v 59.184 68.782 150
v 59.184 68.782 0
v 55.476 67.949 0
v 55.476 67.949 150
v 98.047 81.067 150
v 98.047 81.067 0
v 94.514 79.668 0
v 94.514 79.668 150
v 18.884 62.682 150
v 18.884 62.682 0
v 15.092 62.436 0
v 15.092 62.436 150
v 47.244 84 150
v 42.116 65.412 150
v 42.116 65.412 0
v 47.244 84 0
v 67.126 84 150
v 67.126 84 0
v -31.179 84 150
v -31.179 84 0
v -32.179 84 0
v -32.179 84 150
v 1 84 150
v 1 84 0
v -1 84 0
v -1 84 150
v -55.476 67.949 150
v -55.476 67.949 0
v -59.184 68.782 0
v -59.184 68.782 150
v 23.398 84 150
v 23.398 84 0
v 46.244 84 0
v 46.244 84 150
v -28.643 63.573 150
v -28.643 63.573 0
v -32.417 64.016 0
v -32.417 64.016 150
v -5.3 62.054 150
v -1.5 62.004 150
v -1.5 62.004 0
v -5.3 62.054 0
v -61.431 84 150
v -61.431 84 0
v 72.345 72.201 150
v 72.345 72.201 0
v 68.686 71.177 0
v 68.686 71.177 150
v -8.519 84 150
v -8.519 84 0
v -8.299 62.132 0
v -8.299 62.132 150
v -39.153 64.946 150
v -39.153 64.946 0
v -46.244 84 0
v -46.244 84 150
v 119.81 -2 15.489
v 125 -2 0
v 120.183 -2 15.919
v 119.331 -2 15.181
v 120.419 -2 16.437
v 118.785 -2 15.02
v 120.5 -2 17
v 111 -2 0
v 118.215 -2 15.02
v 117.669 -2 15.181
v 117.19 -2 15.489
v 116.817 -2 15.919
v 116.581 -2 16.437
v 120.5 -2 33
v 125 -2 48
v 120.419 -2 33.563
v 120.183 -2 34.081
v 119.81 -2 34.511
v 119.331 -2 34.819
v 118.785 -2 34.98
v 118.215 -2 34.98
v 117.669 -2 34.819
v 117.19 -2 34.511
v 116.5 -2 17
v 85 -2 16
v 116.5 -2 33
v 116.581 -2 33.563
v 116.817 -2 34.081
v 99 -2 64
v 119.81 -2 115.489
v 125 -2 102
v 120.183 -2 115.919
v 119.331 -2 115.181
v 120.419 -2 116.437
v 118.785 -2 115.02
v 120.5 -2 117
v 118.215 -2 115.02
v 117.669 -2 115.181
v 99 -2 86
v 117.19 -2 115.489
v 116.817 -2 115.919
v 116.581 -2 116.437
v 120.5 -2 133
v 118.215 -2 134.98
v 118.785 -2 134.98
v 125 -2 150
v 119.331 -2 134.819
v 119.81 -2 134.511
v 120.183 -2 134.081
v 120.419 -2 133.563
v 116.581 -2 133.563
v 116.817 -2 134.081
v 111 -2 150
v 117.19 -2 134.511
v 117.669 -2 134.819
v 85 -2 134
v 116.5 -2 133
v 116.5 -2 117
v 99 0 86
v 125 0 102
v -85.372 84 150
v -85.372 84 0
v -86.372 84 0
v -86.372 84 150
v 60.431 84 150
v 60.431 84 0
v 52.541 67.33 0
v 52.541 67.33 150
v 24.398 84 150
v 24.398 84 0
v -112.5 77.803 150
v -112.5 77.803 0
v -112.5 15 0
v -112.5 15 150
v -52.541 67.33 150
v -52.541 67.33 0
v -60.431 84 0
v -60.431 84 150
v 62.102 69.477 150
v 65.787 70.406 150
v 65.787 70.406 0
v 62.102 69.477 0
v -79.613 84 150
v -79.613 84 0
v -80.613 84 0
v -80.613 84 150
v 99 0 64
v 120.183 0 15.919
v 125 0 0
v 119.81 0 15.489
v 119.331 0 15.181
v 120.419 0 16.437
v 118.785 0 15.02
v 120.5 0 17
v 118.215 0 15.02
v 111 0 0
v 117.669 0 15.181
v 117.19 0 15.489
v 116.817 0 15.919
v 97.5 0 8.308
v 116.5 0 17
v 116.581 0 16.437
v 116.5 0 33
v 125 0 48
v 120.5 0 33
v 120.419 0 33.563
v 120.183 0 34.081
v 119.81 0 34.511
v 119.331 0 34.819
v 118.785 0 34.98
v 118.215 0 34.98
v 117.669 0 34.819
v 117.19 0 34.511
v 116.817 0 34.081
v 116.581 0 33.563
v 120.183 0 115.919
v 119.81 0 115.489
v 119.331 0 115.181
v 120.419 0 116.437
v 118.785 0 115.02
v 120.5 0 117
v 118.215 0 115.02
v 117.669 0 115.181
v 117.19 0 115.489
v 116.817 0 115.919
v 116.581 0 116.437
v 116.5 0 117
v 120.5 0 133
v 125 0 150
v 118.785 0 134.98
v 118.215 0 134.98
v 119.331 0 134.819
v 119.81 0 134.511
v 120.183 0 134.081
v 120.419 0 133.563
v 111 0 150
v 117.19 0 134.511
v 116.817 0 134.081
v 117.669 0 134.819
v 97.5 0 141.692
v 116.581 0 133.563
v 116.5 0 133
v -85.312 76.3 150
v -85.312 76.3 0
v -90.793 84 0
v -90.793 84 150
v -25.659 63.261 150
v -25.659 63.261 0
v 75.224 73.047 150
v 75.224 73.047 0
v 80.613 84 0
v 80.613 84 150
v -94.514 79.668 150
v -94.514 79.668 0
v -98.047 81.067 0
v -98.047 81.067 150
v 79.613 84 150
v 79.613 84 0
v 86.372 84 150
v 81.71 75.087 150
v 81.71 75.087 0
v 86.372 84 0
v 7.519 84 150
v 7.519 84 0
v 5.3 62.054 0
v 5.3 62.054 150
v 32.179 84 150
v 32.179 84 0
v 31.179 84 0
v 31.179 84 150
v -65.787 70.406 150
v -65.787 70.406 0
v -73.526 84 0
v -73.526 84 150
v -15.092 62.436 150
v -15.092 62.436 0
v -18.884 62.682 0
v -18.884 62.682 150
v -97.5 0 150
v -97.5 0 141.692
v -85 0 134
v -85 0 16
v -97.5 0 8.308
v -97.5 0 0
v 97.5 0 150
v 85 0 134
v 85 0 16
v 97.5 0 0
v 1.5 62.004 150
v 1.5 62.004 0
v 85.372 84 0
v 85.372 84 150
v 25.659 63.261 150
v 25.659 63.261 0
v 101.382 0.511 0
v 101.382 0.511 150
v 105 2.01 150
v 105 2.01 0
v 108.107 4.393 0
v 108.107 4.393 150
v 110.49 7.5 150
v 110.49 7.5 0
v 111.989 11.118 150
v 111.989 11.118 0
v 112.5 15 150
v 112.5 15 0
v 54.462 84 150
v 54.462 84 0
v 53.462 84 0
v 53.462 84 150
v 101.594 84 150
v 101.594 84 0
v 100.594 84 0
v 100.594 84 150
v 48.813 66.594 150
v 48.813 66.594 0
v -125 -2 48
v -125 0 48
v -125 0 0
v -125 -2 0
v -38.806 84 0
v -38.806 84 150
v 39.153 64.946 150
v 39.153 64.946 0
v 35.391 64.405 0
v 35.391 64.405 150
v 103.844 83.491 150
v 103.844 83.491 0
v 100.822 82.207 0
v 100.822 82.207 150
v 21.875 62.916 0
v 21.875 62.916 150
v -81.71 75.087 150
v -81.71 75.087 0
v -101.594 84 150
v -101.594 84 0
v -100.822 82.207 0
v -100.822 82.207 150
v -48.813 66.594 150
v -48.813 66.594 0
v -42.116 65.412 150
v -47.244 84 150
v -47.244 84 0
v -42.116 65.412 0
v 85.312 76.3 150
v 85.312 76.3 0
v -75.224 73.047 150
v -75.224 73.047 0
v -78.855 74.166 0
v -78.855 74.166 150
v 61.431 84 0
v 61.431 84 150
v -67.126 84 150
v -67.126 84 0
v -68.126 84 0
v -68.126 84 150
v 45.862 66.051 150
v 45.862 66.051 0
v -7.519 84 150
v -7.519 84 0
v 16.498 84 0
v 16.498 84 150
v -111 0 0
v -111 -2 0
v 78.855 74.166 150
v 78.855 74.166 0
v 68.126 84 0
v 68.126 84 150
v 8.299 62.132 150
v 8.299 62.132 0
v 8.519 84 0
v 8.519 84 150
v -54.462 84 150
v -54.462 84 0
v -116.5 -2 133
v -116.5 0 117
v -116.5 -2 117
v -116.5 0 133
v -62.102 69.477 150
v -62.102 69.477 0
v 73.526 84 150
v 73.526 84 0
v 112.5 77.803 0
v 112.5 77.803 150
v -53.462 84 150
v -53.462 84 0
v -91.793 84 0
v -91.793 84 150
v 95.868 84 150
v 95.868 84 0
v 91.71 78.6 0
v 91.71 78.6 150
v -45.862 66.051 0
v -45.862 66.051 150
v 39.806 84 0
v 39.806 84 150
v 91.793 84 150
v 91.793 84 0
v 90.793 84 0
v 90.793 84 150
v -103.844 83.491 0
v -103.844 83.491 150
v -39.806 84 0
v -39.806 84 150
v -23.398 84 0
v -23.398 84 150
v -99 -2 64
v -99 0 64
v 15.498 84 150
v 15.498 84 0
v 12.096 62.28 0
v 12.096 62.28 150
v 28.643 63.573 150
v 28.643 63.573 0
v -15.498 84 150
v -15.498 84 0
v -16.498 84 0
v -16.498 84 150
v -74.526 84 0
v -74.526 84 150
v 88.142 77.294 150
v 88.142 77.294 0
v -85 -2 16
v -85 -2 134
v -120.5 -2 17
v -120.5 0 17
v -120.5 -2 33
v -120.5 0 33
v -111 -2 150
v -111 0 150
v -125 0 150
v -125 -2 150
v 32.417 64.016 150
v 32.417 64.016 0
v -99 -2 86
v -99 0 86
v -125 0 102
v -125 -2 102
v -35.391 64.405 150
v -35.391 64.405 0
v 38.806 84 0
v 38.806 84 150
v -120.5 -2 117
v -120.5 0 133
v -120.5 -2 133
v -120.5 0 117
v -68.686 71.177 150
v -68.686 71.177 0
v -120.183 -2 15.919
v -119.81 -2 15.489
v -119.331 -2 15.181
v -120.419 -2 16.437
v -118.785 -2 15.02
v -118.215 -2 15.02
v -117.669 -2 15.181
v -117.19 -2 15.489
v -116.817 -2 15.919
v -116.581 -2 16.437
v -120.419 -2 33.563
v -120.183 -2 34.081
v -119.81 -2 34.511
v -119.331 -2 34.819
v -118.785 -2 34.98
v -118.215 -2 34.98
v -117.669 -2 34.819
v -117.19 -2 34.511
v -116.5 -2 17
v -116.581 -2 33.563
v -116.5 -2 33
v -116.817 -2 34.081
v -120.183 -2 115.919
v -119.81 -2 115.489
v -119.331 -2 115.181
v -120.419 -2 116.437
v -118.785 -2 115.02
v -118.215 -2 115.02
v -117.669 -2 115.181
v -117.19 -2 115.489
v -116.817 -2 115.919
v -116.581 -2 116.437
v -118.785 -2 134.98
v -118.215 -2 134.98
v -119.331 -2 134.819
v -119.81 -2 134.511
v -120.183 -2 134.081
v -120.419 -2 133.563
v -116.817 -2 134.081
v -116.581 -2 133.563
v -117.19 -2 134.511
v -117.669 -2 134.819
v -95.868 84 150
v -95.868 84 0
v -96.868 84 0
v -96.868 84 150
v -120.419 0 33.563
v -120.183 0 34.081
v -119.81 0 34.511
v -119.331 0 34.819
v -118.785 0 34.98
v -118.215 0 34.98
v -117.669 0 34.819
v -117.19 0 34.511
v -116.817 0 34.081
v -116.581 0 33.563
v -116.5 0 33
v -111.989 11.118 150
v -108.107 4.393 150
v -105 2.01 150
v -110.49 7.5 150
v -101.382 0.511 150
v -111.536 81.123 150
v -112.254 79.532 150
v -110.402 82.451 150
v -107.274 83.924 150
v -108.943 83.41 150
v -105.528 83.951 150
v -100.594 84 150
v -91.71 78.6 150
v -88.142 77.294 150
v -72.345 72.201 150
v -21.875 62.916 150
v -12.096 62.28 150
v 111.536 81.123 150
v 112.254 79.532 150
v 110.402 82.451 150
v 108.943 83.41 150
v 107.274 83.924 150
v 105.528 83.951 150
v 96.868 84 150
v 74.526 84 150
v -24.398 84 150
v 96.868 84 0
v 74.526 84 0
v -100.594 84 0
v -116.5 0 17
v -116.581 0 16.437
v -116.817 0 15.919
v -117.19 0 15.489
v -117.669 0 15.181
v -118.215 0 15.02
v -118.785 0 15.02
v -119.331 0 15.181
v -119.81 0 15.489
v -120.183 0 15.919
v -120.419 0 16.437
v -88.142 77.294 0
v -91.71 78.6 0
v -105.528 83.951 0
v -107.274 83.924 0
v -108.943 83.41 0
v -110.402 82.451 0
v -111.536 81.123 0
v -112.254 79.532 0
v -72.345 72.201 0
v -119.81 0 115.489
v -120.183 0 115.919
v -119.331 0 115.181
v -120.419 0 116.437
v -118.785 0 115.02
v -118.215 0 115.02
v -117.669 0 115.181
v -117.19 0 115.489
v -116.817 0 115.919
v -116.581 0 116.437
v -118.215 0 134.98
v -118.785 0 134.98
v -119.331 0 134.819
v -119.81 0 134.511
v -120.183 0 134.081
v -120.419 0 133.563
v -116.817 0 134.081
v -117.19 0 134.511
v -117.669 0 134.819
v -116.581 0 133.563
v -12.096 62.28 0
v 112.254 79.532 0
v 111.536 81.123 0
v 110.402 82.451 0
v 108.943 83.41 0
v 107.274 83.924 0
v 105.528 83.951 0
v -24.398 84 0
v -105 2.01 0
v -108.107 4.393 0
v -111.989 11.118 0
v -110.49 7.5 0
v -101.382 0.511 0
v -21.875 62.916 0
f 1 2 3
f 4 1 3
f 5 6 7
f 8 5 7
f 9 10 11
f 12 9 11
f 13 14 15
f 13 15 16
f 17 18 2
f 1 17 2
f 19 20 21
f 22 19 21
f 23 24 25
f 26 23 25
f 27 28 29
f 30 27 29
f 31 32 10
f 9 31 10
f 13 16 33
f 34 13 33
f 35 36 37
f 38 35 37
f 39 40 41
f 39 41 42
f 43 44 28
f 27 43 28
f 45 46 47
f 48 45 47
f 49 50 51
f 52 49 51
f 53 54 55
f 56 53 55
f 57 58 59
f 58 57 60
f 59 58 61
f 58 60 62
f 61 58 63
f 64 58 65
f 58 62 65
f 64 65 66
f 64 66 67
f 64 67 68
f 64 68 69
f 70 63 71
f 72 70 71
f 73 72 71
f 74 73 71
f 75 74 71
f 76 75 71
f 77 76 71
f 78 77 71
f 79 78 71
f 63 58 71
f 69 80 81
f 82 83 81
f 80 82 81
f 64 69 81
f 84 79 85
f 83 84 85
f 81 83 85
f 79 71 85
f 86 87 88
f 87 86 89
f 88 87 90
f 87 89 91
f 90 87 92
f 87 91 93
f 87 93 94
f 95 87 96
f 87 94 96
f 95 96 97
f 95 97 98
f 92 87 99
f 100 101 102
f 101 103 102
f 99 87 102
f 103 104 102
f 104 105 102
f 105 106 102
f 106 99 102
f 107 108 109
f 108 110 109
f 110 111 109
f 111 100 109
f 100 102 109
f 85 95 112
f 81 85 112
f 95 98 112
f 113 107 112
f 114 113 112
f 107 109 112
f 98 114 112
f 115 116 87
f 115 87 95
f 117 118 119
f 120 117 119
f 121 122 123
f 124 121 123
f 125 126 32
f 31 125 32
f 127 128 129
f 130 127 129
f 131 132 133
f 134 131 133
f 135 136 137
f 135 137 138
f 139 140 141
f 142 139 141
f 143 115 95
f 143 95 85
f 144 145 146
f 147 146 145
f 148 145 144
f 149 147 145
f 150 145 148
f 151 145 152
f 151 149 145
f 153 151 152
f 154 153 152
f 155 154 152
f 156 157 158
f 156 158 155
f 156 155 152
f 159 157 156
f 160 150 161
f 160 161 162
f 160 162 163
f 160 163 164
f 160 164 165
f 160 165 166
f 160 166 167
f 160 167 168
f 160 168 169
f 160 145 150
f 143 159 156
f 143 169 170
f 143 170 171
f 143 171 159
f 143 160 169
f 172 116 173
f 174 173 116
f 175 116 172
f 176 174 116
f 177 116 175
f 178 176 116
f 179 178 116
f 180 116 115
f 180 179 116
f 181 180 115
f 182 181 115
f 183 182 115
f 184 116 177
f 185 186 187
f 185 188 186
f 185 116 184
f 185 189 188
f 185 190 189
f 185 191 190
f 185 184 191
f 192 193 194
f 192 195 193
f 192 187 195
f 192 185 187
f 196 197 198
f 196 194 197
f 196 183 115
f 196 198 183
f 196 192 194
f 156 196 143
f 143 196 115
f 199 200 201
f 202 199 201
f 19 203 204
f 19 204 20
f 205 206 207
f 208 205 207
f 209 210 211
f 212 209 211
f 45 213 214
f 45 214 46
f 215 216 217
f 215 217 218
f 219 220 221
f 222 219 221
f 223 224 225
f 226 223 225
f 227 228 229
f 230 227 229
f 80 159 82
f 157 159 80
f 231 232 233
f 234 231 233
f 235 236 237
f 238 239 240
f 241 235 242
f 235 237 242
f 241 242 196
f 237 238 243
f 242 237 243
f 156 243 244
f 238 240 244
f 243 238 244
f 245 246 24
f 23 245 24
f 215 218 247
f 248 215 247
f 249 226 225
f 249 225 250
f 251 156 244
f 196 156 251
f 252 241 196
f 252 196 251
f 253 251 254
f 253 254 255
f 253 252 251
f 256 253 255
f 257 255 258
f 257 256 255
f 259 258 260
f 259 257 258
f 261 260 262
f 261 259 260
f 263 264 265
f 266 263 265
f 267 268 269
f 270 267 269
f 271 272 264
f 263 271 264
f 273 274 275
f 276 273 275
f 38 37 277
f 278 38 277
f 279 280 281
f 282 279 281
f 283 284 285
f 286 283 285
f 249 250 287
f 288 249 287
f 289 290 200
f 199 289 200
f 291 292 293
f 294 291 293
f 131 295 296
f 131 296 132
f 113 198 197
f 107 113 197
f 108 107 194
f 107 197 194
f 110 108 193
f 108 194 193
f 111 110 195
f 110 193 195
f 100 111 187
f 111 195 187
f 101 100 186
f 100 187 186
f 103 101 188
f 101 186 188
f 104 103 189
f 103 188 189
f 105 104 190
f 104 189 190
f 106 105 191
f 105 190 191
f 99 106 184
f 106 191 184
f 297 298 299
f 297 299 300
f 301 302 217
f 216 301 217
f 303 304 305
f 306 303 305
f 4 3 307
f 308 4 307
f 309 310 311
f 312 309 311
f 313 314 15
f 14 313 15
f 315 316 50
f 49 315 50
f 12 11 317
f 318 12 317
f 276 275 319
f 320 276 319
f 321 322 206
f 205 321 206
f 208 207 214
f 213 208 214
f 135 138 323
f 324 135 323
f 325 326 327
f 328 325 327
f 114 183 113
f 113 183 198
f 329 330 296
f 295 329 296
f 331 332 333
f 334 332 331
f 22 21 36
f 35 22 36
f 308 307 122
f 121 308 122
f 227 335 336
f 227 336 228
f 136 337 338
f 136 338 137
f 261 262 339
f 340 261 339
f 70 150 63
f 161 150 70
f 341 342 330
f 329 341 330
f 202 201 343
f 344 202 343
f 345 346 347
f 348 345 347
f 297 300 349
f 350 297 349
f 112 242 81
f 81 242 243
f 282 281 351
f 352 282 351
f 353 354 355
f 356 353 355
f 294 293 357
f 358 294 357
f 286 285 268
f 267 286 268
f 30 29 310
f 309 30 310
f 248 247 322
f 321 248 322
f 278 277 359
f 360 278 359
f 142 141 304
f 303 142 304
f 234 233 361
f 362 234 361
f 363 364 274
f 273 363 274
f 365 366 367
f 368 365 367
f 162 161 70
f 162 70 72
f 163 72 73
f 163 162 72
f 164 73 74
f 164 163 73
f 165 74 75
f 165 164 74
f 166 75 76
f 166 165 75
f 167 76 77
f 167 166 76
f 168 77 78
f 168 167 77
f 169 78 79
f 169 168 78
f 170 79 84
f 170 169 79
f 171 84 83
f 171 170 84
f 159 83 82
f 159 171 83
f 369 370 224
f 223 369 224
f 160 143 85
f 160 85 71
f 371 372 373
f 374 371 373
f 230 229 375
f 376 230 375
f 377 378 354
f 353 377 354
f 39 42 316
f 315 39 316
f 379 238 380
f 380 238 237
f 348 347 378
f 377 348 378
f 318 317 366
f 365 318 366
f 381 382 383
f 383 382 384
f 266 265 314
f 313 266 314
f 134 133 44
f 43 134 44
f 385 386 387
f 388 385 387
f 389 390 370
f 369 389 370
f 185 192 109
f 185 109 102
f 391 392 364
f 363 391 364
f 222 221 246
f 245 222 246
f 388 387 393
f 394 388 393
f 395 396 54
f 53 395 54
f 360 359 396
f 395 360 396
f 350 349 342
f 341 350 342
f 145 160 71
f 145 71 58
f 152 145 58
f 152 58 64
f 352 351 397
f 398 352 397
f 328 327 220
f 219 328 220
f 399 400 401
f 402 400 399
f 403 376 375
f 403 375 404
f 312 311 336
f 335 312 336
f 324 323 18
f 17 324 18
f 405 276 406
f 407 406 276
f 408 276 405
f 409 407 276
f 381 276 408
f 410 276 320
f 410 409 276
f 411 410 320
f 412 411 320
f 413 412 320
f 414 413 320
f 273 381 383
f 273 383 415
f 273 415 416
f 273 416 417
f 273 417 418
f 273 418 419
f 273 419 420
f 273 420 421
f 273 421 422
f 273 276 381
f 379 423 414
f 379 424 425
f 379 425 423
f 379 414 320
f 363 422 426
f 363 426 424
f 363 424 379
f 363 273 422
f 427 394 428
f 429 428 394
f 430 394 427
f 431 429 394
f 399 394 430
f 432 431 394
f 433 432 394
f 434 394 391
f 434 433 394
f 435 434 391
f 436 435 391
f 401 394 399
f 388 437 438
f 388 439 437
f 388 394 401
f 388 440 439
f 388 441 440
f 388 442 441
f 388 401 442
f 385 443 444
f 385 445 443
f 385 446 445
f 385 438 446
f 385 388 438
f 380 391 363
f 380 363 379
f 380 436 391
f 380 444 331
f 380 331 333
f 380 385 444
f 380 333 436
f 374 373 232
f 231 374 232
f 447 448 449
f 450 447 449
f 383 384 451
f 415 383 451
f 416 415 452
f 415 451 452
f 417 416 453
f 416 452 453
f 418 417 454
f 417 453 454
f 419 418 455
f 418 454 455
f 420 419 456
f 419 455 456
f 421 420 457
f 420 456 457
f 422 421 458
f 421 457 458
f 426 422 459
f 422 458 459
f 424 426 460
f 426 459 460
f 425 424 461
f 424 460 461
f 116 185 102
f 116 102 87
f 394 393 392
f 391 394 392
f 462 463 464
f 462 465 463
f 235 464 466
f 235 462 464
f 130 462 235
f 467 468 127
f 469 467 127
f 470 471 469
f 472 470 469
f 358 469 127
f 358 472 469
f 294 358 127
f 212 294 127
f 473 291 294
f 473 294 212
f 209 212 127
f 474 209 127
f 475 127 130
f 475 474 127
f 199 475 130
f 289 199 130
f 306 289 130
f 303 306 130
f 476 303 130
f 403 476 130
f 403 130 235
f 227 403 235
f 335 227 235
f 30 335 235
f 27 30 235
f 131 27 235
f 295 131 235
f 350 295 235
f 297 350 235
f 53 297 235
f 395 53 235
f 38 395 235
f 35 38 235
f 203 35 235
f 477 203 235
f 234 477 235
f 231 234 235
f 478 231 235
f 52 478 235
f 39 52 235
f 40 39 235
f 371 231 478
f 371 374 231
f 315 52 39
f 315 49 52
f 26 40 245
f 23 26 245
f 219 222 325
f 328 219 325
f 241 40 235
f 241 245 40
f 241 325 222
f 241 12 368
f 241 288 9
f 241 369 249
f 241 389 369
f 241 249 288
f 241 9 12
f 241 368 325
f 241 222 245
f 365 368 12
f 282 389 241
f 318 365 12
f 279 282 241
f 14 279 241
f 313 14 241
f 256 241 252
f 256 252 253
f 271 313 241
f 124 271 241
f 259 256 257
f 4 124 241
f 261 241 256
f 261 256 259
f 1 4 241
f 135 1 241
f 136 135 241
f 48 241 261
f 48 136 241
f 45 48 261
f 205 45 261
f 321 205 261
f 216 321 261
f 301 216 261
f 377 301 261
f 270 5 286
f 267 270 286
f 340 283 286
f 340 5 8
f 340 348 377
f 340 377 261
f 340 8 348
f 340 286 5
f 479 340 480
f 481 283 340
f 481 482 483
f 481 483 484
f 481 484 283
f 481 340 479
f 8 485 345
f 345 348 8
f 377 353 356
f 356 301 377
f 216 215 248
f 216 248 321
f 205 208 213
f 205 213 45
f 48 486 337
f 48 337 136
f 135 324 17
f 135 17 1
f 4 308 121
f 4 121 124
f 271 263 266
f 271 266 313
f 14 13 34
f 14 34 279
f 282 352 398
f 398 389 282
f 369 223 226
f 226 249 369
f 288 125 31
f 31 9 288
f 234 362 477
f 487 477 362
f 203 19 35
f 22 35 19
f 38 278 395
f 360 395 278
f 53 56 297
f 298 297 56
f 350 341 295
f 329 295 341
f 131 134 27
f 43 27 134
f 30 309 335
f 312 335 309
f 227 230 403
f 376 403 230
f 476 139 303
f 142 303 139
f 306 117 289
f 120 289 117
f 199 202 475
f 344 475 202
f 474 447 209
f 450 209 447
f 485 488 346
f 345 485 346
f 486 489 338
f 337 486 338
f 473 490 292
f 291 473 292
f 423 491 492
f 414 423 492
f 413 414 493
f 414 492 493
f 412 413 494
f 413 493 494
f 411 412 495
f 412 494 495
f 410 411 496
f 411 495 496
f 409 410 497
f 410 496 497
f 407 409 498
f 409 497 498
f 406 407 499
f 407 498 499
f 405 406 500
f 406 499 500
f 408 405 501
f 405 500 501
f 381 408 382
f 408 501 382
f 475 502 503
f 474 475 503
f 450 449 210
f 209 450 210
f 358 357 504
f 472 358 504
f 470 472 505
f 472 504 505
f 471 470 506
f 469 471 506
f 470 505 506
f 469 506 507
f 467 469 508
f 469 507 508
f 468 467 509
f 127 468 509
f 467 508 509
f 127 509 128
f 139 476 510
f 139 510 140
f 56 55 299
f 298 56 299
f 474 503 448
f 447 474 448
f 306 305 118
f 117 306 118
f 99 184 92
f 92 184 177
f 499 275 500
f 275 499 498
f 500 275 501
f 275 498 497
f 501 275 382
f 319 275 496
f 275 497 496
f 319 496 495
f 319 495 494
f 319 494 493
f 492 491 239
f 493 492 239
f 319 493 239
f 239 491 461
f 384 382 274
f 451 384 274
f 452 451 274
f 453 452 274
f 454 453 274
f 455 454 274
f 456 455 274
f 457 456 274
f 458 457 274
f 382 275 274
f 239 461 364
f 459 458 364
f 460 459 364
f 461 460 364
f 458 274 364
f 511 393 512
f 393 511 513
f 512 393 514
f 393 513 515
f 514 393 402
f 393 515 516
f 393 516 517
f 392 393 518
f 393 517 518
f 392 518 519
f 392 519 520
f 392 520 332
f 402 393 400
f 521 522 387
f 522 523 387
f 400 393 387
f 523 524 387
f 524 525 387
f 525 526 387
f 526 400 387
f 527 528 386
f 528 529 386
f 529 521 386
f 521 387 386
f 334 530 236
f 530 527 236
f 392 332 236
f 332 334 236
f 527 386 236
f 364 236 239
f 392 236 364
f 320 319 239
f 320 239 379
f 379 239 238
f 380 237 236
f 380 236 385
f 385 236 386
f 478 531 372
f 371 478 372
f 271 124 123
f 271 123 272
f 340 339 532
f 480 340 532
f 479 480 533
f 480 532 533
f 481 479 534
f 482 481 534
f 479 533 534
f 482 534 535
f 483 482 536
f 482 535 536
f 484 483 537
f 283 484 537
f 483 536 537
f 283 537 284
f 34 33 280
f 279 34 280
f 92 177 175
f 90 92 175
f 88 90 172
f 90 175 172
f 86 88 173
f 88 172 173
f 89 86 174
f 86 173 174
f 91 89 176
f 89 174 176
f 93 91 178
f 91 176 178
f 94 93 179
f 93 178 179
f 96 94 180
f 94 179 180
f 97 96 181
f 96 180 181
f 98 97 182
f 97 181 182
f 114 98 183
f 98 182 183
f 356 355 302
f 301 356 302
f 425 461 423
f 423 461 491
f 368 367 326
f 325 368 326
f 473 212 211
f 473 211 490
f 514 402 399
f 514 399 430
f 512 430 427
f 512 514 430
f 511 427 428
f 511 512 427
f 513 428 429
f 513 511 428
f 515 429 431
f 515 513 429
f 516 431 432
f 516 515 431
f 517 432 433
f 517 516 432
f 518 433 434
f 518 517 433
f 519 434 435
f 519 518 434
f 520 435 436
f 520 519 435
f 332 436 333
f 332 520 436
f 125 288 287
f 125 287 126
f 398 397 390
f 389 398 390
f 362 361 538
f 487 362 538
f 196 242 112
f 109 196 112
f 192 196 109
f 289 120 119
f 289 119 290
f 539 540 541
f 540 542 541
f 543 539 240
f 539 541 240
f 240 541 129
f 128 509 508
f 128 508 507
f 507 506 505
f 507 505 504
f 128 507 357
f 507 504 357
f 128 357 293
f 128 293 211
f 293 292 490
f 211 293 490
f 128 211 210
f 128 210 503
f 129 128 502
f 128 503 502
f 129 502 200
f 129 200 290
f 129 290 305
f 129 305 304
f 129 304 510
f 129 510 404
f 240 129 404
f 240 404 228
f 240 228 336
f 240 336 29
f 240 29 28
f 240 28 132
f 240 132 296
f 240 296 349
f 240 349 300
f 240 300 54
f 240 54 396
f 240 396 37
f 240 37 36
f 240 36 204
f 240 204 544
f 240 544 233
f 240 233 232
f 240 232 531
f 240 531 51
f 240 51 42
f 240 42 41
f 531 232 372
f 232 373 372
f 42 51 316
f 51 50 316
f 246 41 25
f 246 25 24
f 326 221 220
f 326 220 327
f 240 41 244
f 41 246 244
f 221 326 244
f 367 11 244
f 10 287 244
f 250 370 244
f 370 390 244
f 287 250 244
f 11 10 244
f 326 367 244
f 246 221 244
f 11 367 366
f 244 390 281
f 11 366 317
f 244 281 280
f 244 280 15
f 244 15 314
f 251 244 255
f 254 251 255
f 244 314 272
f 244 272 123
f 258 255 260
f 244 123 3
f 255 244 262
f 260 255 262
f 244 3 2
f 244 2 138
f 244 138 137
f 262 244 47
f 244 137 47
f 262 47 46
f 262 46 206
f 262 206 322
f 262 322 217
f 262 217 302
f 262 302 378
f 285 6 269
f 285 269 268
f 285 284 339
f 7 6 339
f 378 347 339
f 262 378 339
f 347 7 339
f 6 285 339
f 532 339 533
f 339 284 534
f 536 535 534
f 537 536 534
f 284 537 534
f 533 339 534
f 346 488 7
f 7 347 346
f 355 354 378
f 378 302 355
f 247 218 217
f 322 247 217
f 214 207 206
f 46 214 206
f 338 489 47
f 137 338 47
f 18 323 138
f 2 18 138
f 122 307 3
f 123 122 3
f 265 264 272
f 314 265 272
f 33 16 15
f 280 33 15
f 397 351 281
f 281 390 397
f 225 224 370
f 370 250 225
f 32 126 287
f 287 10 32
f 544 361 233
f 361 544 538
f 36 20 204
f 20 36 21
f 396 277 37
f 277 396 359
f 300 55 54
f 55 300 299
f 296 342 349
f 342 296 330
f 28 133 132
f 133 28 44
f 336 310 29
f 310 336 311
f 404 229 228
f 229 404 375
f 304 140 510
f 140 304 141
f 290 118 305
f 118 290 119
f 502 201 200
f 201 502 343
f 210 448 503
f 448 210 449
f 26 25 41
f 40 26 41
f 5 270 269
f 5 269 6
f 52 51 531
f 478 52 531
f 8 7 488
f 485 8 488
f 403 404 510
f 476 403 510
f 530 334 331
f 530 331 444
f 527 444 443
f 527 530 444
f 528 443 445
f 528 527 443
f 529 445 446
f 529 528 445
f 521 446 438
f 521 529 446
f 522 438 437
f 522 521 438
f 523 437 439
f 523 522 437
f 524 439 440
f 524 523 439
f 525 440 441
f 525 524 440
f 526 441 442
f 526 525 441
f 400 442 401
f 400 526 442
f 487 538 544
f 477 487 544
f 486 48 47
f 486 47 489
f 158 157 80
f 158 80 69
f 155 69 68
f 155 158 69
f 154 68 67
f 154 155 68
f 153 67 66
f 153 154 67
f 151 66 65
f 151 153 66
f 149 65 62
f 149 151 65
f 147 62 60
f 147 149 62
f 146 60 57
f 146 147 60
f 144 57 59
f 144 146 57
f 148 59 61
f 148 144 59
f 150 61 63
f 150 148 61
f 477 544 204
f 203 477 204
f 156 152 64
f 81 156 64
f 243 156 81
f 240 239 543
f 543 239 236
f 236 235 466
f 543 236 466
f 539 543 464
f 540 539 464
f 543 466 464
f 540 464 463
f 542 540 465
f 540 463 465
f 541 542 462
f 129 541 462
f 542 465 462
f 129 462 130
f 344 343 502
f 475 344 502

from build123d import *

# Parameters (mm, degrees)
BOSS_EXTRU_1_DEPTH = 150
CONG_1_R           = 15
BOSS_EXTRU_2_DEPTH = 2


with BuildPart() as part:
    # Esquisse1 → Boss.-Extru.1 (new body)
    with BuildSketch(Plane.XY):
        with BuildLine():
            Line((-112.5, 0), (112.5, 0))
            Line((112.5, 0), (112.5, 77.803254504))
            ThreePointArc((112.5, 77.803254504), (109.706079374, 82.982099708), (103.843702056, 83.490983093))
            Line((103.843702056, 83.490983093), (100.822174185, 82.206822173))
            Line((100.822174185, 82.206822173), (101.593849269, 84))
            Line((101.593849269, 84), (100.593849269, 84))
            Line((100.593849269, 84), (98.047294459, 81.066628108))
            Line((98.047294459, 81.066628108), (94.513975375, 79.668180307))
            Line((94.513975375, 79.668180307), (96.868414967, 84))
            Line((96.868414967, 84), (95.868414967, 84))
            Line((95.868414967, 84), (91.710401321, 78.600485349))
            Line((91.710401321, 78.600485349), (88.141932533, 77.29433432))
            Line((88.141932533, 77.29433432), (91.793248094, 84))
            Line((91.793248094, 84), (90.793248094, 84))
            Line((90.793248094, 84), (85.311557961, 76.299859694))
            Line((85.311557961, 76.299859694), (81.710349964, 75.086887739))
            Line((81.710349964, 75.086887739), (86.372418591, 84))
            Line((86.372418591, 84), (85.372418591, 84))
            Line((85.372418591, 84), (78.855086787, 74.166305212))
            Line((78.855086787, 74.166305212), (75.223572191, 73.047331693))
            Line((75.223572191, 73.047331693), (80.613241264, 84))
            Line((80.613241264, 84), (79.613241264, 84))
            Line((79.613241264, 84), (72.345349134, 72.201263116))
            Line((72.345349134, 72.201263116), (68.685981021, 71.177043896))
            Line((68.685981021, 71.177043896), (74.526463538, 84))
            Line((74.526463538, 84), (73.526463538, 84))
            Line((73.526463538, 84), (65.786742319, 70.406060788))
            Line((65.786742319, 70.406060788), (62.101992586, 69.477287727))
            Line((62.101992586, 69.477287727), (68.126397614, 84))
            Line((68.126397614, 84), (67.126397614, 84))
            Line((67.126397614, 84), (59.183696671, 68.781910885))
            Line((59.183696671, 68.781910885), (55.476054359, 67.949211366))
            Line((55.476054359, 67.949211366), (61.430986278, 84))
            Line((61.430986278, 84), (60.430986278, 84))
            Line((60.430986278, 84), (52.540672534, 67.329910517))
            Line((52.540672534, 67.329910517), (48.81264215, 66.593847028))
            Line((48.81264215, 66.593847028), (54.461792967, 84))
            Line((54.461792967, 84), (53.461792967, 84))
            Line((53.461792967, 84), (45.862157261, 66.051040507))
            Line((45.862157261, 66.051040507), (42.116257084, 65.412110258))
            Line((42.116257084, 65.412110258), (47.243908802, 84))
            Line((47.243908802, 84), (46.243908802, 84))
            Line((46.243908802, 84), (39.152662178, 64.946164731))
            Line((39.152662178, 64.946164731), (35.391422557, 64.404799318))
            Line((35.391422557, 64.404799318), (39.805772012, 84))
            Line((39.805772012, 84), (38.805772012, 84))
            Line((38.805772012, 84), (32.416719538, 64.01602953))
            Line((32.416719538, 64.01602953), (28.642681183, 63.572594644))
            Line((28.642681183, 63.572594644), (32.178898512, 84))
            Line((32.178898512, 84), (31.178898512, 84))
            Line((31.178898512, 84), (25.658879458, 63.261263209))
            Line((25.658879458, 63.261263209), (21.874591726, 62.91605839))
            Line((21.874591726, 62.91605839), (24.397526133, 84))
            Line((24.397526133, 84), (23.397526133, 84))
            Line((23.397526133, 84), (18.883706848, 62.682375611))
            Line((18.883706848, 62.682375611), (15.09172602, 62.435634044))
            Line((15.09172602, 62.435634044), (16.498178932, 84))
            Line((16.498178932, 84), (15.498178932, 84))
            Line((15.498178932, 84), (12.095778325, 62.279757774))
            Line((12.095778325, 62.279757774), (8.298665877, 62.131646133))
            Line((8.298665877, 62.131646133), (8.519161913, 84))
            Line((8.519161913, 84), (7.519161913, 84))
            Line((7.519161913, 84), (5.299679125, 62.053681665))
            Line((5.299679125, 62.053681665), (1.5, 62.004299999))
            Line((1.5, 62.004299999), (1, 84))
            Line((1, 84), (-1, 84))
            Line((-1, 84), (-1.5, 62.004299999))
            Line((-1.5, 62.004299999), (-5.299679125, 62.053681665))
            Line((-5.299679125, 62.053681665), (-7.519161913, 84))
            Line((-7.519161913, 84), (-8.519161913, 84))
            Line((-8.519161913, 84), (-8.298665877, 62.131646133))
            Line((-8.298665877, 62.131646133), (-12.095778325, 62.279757774))
            Line((-12.095778325, 62.279757774), (-15.498178932, 84))
            Line((-15.498178932, 84), (-16.498178932, 84))
            Line((-16.498178932, 84), (-15.09172602, 62.435634044))
            Line((-15.09172602, 62.435634044), (-18.883706848, 62.682375611))
            Line((-18.883706848, 62.682375611), (-23.397526133, 84))
            Line((-23.397526133, 84), (-24.397526133, 84))
            Line((-24.397526133, 84), (-21.874591726, 62.91605839))
            Line((-21.874591726, 62.91605839), (-25.658879458, 63.261263209))
            Line((-25.658879458, 63.261263209), (-31.178898512, 84))
            Line((-31.178898512, 84), (-32.178898512, 84))
            Line((-32.178898512, 84), (-28.642681183, 63.572594644))
            Line((-28.642681183, 63.572594644), (-32.416719538, 64.01602953))
            Line((-32.416719538, 64.01602953), (-38.805772012, 84))
            Line((-38.805772012, 84), (-39.805772012, 84))
            Line((-39.805772012, 84), (-35.391422557, 64.404799318))
            Line((-35.391422557, 64.404799318), (-39.152662178, 64.946164731))
            Line((-39.152662178, 64.946164731), (-46.243908802, 84))
            Line((-46.243908802, 84), (-47.243908802, 84))
            Line((-47.243908802, 84), (-42.116257084, 65.412110258))
            Line((-42.116257084, 65.412110258), (-45.862157261, 66.051040507))
            Line((-45.862157261, 66.051040507), (-53.461792967, 84))
            Line((-53.461792967, 84), (-54.461792967, 84))
            Line((-54.461792967, 84), (-48.81264215, 66.593847028))
            Line((-48.81264215, 66.593847028), (-52.540672534, 67.329910517))
            Line((-52.540672534, 67.329910517), (-60.430986278, 84))
            Line((-60.430986278, 84), (-61.430986278, 84))
            Line((-61.430986278, 84), (-55.476054359, 67.949211366))
            Line((-55.476054359, 67.949211366), (-59.183696671, 68.781910885))
            Line((-59.183696671, 68.781910885), (-67.126397614, 84))
            Line((-67.126397614, 84), (-68.126397614, 84))
            Line((-68.126397614, 84), (-62.101992586, 69.477287727))
            Line((-62.101992586, 69.477287727), (-65.786742319, 70.406060788))
            Line((-65.786742319, 70.406060788), (-73.526463538, 84))
            Line((-73.526463538, 84), (-74.526463538, 84))
            Line((-74.526463538, 84), (-68.685981021, 71.177043896))
            Line((-68.685981021, 71.177043896), (-72.345349134, 72.201263116))
            Line((-72.345349134, 72.201263116), (-79.613241264, 84))
            Line((-79.613241264, 84), (-80.613241264, 84))
            Line((-80.613241264, 84), (-75.223572191, 73.047331693))
            Line((-75.223572191, 73.047331693), (-78.855086787, 74.166305212))
            Line((-78.855086787, 74.166305212), (-85.372418591, 84))
            Line((-85.372418591, 84), (-86.372418591, 84))
            Line((-86.372418591, 84), (-81.710349964, 75.086887739))
            Line((-81.710349964, 75.086887739), (-85.311557961, 76.299859694))
            Line((-85.311557961, 76.299859694), (-90.793248094, 84))
            Line((-90.793248094, 84), (-91.793248094, 84))
            Line((-91.793248094, 84), (-88.141932533, 77.29433432))
            Line((-88.141932533, 77.29433432), (-91.710401321, 78.600485349))
            Line((-91.710401321, 78.600485349), (-95.868414967, 84))
            Line((-95.868414967, 84), (-96.868414967, 84))
            Line((-96.868414967, 84), (-94.513975375, 79.668180307))
            Line((-94.513975375, 79.668180307), (-98.047294459, 81.066628108))
            Line((-98.047294459, 81.066628108), (-100.593849269, 84))
            Line((-100.593849269, 84), (-101.593849269, 84))
            Line((-101.593849269, 84), (-100.822174185, 82.206822173))
            Line((-100.822174185, 82.206822173), (-103.843702056, 83.490983093))
            ThreePointArc((-103.843702056, 83.490983093), (-109.706079374, 82.982099708), (-112.5, 77.803254504))
            Line((-112.5, 77.803254504), (-112.5, 0))
        make_face()
    extrude(amount=BOSS_EXTRU_1_DEPTH)

    # Congé1
    cong_1_edges = [part.edges().sort_by_distance(p)[0] for p in [
        (112.5, 0, 75),
        (-112.5, 0, 75),
    ]]
    fillet(cong_1_edges, radius=CONG_1_R)

    # Esquisse2 → Boss.-Extru.2 (add)
    # profile 1 of 2: a face of its own
    with BuildSketch(Plane.XZ):
        Polygon((85, 134), (111, 150), (125, 150), (125, 102), (99, 86), (99, 64), (125, 48), (125, 0), (111, 0), (85, 16), (85, 34.748316978), align=None)
        with BuildLine():
            Line((120.5, 133), (120.5, 117))
            ThreePointArc((120.5, 117), (118.5, 115), (116.5, 117))
            Line((116.5, 117), (116.5, 133))
            ThreePointArc((116.5, 133), (118.5, 135), (120.5, 133))
        make_face(mode=Mode.SUBTRACT)
        with BuildLine():
            Line((120.5, 17), (120.5, 33))
            ThreePointArc((120.5, 33), (118.5, 35), (116.5, 33))
            Line((116.5, 33), (116.5, 17))
            ThreePointArc((116.5, 17), (118.5, 15), (120.5, 17))
        make_face(mode=Mode.SUBTRACT)
    # profile 2 of 2: a face of its own
    with BuildSketch(Plane.XZ):
        Polygon((-85, 34.748316978), (-85, 134), (-111, 150), (-125, 150), (-125, 102), (-99, 86), (-99, 64), (-125, 48), (-125, 0), (-111, 0), (-85, 16), align=None)
        with BuildLine():
            Line((-120.5, 133), (-120.5, 117))
            ThreePointArc((-120.5, 117), (-118.5, 115), (-116.5, 117))
            Line((-116.5, 117), (-116.5, 133))
            ThreePointArc((-116.5, 133), (-118.5, 135), (-120.5, 133))
        make_face(mode=Mode.SUBTRACT)
        with BuildLine():
            Line((-120.5, 17), (-120.5, 33))
            ThreePointArc((-120.5, 33), (-118.5, 35), (-116.5, 33))
            Line((-116.5, 33), (-116.5, 17))
            ThreePointArc((-116.5, 17), (-118.5, 15), (-120.5, 17))
        make_face(mode=Mode.SUBTRACT)
    extrude(amount=BOSS_EXTRU_2_DEPTH)


solid = part.part
